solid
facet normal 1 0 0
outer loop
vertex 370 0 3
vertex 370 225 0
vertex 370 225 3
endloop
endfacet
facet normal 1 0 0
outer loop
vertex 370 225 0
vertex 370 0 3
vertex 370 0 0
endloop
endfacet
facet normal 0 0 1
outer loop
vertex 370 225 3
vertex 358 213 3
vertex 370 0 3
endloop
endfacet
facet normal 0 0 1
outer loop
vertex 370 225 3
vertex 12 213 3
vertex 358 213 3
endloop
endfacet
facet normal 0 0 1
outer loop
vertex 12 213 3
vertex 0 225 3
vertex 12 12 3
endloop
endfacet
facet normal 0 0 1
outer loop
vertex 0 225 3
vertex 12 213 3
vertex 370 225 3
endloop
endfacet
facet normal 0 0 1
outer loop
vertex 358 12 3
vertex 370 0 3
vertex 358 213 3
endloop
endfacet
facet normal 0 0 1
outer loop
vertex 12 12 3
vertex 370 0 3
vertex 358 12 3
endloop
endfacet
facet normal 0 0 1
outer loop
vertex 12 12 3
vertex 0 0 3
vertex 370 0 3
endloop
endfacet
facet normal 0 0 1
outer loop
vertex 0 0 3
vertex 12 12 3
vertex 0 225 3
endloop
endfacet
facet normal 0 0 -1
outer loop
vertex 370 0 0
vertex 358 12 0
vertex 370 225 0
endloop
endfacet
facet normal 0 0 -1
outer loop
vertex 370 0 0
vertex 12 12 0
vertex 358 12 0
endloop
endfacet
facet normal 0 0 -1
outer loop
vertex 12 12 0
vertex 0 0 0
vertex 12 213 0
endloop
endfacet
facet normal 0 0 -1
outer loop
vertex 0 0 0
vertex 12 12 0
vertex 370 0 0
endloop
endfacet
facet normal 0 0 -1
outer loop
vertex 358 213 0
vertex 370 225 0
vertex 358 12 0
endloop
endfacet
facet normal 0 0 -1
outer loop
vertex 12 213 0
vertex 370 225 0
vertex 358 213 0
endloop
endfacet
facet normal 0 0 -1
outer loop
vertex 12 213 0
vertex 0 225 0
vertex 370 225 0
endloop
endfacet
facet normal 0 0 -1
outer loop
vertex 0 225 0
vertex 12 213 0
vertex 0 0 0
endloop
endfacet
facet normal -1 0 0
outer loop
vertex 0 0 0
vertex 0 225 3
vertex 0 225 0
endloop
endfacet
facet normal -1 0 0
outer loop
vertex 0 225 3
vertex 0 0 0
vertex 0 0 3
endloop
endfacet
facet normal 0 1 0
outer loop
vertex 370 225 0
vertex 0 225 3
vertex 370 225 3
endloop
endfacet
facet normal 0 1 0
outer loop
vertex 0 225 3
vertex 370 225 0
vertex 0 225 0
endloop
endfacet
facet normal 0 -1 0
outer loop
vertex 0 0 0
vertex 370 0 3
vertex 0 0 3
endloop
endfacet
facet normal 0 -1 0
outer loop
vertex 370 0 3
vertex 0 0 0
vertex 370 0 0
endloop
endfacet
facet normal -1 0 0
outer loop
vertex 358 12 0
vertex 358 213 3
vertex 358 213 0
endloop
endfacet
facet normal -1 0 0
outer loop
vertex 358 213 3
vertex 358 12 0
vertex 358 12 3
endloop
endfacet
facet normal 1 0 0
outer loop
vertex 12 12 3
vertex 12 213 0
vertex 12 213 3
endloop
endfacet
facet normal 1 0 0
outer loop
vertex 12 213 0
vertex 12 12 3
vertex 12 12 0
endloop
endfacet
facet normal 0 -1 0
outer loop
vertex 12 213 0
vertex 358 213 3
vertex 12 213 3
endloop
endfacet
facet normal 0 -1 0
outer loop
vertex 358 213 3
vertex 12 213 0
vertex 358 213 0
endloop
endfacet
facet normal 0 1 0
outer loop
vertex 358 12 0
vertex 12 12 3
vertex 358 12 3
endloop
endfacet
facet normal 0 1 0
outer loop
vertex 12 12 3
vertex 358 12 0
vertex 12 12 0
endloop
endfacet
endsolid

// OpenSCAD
// ModuDeck donor chassis study: NOT a verified ThinkPad fit.
// Millimetres. 370x240 is an unconfirmed owner measurement.
$fn=32; W=370; D=240; t=3;
module plate(w,d,h){cube([w,d,h]);}
module shell(w,d,h){difference(){cube([w,d,h]);translate([t,t,t])cube([w-2*t,d-2*t,h]);}}
module hole(x,y,h){translate([x,y,-1])cylinder(d=3.4,h=h+2);}
module rail(n){difference(){cube([n,12,6]);for(x=[10:20:n-10])hole(x,6,6);}}
module rear(){difference(){cube([W-6,3,25]);translate([W/2-23,-1,6])cube([40,5,14]);for(x=[10,W-16])translate([x,-1,12])rotate([-90,0,0])cylinder(d=3.4,h=5);}}
module tray(){difference(){shell(W,D,30);translate([3,D-4,3])cube([W-6,6,27]);for(x=[15,W-15],y=[15,D-15])hole(x,y,30);}}
difference(){cube([W,225,3]);translate([12,12,-1])cube([W-24,201,5]);}
